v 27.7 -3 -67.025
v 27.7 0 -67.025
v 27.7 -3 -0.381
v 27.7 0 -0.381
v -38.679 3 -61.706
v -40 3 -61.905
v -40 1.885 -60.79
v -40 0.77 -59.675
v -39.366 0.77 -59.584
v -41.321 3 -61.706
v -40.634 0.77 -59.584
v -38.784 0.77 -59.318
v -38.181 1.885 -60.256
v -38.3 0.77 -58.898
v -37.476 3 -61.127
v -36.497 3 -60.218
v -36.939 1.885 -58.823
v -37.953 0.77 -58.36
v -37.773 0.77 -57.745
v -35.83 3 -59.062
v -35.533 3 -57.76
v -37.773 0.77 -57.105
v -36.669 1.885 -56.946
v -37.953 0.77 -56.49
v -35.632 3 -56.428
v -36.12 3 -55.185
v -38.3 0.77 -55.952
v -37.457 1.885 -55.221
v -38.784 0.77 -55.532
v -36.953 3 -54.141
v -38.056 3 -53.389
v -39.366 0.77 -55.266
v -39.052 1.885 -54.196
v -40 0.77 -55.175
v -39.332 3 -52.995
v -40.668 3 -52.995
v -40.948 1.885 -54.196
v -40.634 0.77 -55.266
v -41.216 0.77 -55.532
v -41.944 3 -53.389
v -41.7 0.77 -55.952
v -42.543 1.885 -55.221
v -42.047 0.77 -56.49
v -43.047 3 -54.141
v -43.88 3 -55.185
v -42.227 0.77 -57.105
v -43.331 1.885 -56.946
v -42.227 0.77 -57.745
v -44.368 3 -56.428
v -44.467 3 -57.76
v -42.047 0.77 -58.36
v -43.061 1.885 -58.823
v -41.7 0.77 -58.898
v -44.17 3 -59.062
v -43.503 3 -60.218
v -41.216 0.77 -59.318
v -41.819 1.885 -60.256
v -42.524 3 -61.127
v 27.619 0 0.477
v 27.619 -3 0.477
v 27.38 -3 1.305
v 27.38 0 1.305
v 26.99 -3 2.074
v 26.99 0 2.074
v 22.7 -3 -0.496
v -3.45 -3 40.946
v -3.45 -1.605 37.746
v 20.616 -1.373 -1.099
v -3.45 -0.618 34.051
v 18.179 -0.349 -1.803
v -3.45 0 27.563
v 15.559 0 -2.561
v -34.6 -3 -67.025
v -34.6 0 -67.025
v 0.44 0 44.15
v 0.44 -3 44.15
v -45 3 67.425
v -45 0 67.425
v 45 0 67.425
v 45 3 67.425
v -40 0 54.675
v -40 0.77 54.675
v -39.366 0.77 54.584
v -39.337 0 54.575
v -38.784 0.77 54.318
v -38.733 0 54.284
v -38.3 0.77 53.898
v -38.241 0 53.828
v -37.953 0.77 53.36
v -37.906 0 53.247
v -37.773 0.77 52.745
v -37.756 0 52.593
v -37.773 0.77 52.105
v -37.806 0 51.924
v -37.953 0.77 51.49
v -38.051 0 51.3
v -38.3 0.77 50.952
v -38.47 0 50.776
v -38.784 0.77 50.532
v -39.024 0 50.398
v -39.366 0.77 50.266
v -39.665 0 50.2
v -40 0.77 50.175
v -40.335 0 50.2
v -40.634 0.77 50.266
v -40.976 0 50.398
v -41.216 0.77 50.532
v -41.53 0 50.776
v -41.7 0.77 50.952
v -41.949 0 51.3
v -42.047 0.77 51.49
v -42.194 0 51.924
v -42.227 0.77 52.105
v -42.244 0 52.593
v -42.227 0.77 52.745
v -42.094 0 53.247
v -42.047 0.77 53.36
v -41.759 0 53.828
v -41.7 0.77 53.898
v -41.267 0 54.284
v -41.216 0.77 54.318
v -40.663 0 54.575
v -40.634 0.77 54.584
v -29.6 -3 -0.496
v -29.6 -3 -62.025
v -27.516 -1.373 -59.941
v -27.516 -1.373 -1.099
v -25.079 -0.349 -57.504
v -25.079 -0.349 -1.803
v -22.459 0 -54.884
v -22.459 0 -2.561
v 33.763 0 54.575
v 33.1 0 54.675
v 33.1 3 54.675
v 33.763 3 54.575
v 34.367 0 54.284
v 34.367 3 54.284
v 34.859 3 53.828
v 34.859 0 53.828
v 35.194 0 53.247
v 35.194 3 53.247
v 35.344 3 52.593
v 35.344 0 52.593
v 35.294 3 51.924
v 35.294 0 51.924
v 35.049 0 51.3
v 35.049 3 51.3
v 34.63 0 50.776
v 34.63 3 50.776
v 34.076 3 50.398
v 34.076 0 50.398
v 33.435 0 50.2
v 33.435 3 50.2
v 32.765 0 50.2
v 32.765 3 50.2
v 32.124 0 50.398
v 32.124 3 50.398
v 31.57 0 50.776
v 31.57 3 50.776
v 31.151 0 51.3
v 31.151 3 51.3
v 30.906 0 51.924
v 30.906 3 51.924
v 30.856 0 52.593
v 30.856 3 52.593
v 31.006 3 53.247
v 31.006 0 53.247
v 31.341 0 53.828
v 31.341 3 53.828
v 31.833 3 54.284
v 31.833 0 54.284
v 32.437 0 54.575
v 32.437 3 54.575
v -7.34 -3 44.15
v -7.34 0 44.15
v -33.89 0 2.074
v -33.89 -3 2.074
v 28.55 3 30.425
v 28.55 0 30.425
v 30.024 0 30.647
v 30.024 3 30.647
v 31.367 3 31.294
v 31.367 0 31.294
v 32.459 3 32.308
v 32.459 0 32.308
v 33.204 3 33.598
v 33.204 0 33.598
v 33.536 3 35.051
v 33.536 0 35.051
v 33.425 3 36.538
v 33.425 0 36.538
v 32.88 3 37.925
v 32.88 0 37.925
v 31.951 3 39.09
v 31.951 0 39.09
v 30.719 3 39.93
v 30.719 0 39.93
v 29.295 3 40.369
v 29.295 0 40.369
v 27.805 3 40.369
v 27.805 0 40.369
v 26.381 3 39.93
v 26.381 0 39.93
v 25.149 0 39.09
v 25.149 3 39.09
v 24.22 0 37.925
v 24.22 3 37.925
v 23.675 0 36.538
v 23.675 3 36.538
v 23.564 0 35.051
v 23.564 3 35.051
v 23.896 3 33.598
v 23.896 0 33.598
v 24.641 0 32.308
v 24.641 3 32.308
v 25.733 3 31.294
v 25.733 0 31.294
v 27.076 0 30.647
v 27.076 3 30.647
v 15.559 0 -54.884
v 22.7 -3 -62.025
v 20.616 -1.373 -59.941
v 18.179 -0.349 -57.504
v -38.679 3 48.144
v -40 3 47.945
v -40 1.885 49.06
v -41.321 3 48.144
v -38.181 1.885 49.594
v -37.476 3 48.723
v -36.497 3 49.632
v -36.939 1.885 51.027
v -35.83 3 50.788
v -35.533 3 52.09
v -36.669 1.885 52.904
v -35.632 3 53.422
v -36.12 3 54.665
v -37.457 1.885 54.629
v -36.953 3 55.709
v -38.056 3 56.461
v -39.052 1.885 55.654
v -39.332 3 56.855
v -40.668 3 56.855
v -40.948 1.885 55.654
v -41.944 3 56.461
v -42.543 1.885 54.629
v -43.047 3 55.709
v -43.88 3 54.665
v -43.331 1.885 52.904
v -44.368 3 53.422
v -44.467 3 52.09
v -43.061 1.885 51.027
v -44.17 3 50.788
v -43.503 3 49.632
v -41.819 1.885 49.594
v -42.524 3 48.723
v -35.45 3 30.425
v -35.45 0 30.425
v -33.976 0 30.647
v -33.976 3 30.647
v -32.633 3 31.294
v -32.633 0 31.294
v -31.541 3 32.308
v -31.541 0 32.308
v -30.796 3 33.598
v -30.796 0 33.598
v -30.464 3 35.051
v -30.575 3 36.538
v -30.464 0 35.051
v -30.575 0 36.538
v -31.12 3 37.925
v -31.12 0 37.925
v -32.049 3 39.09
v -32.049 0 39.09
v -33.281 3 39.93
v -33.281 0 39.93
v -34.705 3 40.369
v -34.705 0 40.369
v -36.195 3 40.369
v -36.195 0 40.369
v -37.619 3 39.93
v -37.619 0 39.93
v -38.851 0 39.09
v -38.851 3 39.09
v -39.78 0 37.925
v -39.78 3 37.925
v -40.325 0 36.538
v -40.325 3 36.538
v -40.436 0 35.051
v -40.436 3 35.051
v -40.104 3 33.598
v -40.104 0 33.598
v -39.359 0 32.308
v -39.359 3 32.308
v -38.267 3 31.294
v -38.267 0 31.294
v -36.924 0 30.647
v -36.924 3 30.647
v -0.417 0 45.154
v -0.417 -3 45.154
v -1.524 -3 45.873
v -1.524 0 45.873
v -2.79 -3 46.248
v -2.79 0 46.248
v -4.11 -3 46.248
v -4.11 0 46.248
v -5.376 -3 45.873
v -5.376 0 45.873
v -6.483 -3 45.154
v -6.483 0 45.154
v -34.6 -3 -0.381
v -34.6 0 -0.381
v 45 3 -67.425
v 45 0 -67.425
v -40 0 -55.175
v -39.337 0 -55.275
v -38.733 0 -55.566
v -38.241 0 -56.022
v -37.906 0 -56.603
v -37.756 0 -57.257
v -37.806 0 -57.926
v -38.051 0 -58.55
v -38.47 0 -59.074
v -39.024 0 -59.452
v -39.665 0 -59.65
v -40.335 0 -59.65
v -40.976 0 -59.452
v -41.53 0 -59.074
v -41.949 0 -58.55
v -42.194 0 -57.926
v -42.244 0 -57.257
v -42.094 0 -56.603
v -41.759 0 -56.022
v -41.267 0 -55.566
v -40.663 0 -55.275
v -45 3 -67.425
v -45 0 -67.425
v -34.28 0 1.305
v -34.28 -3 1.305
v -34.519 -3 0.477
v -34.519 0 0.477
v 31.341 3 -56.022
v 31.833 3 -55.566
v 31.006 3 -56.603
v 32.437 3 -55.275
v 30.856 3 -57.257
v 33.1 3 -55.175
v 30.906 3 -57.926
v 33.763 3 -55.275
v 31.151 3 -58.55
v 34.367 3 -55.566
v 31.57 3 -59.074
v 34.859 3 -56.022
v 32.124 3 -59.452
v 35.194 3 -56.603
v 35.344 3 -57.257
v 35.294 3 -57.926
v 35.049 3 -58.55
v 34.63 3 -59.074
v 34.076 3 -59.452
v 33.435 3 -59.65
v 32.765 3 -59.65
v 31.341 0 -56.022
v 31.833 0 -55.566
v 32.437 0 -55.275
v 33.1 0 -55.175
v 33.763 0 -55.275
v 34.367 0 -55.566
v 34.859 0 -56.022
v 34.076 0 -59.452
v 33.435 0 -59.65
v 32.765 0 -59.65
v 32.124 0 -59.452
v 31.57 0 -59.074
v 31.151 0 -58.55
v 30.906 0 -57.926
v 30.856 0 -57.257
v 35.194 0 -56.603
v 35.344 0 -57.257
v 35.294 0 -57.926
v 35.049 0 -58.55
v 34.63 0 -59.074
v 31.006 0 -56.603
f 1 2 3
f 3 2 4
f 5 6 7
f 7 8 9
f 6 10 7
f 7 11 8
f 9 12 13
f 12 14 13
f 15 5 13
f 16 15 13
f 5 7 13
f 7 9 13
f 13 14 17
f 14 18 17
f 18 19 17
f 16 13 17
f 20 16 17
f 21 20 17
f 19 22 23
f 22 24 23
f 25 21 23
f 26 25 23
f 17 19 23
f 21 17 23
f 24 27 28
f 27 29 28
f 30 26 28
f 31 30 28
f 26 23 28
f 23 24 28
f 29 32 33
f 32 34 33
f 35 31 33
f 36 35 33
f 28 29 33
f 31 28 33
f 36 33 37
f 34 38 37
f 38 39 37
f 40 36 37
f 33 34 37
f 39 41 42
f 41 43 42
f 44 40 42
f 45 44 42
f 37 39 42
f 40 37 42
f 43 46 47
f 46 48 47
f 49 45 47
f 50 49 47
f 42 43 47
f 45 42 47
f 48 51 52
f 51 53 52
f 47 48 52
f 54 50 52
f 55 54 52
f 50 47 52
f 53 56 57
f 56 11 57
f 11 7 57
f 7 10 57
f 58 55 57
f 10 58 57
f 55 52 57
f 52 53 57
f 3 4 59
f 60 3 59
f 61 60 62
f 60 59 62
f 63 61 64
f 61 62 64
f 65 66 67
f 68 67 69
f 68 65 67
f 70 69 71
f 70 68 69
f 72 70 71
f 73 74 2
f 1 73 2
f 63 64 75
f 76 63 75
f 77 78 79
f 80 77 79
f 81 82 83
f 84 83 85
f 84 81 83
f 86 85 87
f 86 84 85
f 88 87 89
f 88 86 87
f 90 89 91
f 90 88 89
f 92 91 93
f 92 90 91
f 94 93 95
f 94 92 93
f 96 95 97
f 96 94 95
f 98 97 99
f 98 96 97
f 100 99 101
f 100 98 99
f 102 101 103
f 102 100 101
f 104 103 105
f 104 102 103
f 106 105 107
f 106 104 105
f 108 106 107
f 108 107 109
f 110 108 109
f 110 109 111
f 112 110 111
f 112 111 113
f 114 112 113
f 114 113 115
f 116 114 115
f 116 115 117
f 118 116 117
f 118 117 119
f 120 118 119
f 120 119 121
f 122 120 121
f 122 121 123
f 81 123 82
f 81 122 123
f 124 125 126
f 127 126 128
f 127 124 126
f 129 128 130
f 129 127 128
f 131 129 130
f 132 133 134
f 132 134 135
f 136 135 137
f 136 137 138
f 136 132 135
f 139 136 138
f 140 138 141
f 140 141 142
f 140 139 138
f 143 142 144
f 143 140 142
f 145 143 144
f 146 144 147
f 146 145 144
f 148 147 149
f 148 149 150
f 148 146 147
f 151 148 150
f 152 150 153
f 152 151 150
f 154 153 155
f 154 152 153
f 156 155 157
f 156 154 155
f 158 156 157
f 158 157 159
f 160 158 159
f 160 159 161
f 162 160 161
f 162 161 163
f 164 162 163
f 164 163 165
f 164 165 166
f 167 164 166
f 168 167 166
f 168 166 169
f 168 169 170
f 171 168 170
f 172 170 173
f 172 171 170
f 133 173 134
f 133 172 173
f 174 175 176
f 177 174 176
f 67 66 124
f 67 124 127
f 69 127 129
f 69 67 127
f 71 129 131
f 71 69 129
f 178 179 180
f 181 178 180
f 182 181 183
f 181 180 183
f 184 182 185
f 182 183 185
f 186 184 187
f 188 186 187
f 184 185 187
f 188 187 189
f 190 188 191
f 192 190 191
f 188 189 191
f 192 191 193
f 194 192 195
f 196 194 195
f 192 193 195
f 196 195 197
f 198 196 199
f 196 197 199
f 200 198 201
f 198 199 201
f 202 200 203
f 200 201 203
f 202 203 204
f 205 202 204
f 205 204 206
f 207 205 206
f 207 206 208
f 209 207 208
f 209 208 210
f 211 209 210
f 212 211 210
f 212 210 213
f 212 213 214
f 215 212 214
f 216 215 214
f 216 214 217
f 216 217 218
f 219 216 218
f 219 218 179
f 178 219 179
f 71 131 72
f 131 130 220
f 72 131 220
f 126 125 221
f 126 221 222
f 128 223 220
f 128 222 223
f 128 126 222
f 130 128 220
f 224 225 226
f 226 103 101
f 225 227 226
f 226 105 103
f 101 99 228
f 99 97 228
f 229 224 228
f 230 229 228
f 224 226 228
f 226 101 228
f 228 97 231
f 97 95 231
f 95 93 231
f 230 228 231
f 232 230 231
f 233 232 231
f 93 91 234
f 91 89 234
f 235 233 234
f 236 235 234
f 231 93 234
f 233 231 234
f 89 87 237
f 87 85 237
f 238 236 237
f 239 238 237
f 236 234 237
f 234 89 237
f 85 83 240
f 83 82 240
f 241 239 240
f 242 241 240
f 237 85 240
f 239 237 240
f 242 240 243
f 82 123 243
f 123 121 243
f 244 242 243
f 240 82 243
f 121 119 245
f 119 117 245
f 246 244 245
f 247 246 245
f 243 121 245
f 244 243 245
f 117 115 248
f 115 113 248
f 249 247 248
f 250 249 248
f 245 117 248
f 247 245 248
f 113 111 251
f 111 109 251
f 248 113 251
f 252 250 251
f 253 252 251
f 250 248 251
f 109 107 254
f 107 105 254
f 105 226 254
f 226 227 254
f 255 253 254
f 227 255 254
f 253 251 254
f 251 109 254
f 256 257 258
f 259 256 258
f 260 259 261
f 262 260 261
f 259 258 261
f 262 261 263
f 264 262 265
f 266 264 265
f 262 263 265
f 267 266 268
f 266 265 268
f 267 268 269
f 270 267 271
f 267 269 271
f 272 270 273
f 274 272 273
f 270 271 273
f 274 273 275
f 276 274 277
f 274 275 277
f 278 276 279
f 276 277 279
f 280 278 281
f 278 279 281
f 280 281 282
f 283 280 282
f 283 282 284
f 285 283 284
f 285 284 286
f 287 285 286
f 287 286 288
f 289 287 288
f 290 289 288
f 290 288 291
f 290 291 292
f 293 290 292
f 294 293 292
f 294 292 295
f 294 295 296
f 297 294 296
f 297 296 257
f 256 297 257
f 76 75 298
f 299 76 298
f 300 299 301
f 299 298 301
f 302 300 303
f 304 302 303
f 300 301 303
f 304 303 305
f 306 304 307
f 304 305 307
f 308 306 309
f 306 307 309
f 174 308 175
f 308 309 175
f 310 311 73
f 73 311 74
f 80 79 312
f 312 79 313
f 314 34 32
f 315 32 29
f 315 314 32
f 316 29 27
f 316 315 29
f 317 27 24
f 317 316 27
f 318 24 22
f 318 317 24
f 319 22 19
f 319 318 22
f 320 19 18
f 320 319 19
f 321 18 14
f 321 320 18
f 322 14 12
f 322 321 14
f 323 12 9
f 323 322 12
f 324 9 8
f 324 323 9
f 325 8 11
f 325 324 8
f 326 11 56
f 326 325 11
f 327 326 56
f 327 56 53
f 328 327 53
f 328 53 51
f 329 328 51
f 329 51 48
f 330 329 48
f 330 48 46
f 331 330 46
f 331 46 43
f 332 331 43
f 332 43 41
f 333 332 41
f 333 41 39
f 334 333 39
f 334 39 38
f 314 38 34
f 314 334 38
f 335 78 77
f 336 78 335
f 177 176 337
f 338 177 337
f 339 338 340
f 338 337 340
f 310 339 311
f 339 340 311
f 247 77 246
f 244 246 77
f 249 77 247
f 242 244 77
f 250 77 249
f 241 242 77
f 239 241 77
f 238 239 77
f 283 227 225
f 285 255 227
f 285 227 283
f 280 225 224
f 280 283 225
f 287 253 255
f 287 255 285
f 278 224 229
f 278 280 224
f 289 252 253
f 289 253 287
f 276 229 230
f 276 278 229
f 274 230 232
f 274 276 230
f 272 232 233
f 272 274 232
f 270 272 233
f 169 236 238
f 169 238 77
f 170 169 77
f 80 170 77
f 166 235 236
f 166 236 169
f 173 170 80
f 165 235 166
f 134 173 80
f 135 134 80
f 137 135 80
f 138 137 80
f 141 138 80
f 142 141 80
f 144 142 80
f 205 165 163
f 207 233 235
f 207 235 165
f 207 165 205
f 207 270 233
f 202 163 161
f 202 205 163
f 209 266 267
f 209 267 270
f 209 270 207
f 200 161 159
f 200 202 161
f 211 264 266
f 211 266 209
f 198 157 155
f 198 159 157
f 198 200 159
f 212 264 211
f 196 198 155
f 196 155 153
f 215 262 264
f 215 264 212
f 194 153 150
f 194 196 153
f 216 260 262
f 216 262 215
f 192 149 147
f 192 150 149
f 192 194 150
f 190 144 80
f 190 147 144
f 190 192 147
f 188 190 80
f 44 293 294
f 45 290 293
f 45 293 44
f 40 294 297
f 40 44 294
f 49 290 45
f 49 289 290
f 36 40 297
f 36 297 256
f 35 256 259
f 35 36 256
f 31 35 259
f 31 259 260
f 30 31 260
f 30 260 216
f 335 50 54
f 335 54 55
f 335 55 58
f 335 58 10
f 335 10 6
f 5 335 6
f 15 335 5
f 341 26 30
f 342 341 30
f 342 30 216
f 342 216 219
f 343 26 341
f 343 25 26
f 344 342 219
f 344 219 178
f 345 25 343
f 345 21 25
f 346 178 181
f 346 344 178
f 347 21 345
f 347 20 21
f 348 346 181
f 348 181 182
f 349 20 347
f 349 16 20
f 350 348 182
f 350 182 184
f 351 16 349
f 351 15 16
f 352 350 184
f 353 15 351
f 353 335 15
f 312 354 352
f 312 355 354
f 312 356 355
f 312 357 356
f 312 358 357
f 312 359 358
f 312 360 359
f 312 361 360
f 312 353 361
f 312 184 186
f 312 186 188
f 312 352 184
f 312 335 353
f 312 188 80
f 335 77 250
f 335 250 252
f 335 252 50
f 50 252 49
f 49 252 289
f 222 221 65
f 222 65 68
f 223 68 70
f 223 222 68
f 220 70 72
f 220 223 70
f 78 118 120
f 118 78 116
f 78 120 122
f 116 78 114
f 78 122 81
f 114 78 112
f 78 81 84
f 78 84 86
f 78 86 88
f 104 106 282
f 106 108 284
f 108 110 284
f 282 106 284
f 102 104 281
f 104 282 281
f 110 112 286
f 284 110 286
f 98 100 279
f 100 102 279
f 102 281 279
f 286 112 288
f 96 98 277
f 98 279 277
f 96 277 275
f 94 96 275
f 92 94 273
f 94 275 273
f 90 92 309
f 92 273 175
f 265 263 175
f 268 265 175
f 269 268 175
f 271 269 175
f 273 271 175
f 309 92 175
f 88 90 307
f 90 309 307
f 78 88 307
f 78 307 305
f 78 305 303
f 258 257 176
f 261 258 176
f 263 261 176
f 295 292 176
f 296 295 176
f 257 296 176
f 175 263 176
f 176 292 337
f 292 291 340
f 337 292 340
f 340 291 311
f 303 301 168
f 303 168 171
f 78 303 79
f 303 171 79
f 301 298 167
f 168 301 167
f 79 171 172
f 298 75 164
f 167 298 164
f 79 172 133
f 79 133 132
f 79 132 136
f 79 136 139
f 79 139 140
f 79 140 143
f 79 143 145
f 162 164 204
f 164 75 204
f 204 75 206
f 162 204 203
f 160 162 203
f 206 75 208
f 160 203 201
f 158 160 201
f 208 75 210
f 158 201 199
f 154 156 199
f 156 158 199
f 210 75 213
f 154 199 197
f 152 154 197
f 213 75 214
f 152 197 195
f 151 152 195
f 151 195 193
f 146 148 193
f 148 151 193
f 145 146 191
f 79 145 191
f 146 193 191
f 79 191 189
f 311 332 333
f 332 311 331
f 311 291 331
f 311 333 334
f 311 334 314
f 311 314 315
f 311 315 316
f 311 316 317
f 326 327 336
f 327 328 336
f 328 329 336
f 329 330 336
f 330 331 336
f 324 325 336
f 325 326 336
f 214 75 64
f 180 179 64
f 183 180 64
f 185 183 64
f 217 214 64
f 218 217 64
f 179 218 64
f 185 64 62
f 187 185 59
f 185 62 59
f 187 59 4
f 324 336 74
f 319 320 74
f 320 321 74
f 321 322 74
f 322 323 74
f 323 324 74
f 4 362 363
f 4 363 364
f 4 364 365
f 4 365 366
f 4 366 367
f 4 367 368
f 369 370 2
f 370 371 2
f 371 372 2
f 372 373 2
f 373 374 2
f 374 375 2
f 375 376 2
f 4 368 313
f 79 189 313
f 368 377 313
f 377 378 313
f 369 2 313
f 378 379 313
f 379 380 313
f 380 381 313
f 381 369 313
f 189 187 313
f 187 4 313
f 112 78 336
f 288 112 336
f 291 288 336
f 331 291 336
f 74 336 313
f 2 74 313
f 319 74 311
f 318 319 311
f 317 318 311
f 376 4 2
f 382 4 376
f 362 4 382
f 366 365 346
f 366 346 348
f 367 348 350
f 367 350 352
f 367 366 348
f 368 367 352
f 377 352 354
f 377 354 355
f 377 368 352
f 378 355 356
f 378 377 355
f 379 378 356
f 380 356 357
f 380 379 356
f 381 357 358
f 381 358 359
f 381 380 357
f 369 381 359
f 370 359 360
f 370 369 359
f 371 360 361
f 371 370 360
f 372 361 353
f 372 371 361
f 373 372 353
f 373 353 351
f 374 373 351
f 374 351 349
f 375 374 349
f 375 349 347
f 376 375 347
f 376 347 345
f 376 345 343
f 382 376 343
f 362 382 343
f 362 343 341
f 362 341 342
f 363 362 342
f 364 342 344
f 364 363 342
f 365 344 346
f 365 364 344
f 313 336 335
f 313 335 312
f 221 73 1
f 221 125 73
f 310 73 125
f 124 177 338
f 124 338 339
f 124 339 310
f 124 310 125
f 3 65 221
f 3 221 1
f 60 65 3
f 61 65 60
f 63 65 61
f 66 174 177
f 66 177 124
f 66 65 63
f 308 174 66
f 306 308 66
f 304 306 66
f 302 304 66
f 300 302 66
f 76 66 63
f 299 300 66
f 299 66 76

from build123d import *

# Parameters (mm, degrees)
SKETCH1_W                                            = 90
SKETCH1_H                                            = 134.85
SKETCH1_R                                            = 2.25
BOSS_EXTRUDE1_DEPTH                                  = 3
SKETCH2_R                                            = 5
CUT_EXTRUDE1_DEPTH                                   = 10
BOSS_EXTRUDE2_DEPTH                                  = 3
FILLET1_R                                            = 10
AVELLANADO_PARA_TORNILLO_TAP_N_AVELLANAD_D           = 4.5
AVELLANADO_PARA_TORNILLO_TAP_N_AVELLANAD_DEPTH       = 6
AVELLANADO_PARA_TORNILLO_TAP_N_AVELLANAD_CSINK_D     = 8.96
AVELLANADO_PARA_TORNILLO_TAP_N_AVELLANAD_CSINK_ANGLE = 90
AVELLANADO_PARA_TORNILLO_TAP_N_AVELLANAD_TIP         = 1.351936393


with BuildPart() as part:
    # Sketch1 → Boss-Extrude1 (new body)
    with BuildSketch(Plane(origin=(0, 0, 0), x_dir=(1, 0, 0), z_dir=(0, 1, 0))):
        Rectangle(SKETCH1_W, SKETCH1_H)
        with Locations(Location((-40, 57.425, 0), (0, 0, 270))):
            Circle(SKETCH1_R, mode=Mode.SUBTRACT)
        with Locations(Location((33.1, 57.425, 0), (0, 0, 270))):
            Circle(SKETCH1_R, mode=Mode.SUBTRACT)
        with Locations(Location((33.1, -52.425, 0), (0, 0, 270))):
            Circle(SKETCH1_R, mode=Mode.SUBTRACT)
        with Locations(Location((-40, -52.425, 0), (0, 0, 270))):
            Circle(SKETCH1_R, mode=Mode.SUBTRACT)
    extrude(amount=BOSS_EXTRUDE1_DEPTH)

    # Sketch2 → Cut-Extrude1 (cut)
    with BuildSketch(Plane.XZ):
        with Locations(Location((-35.45, 35.425, 0), (0, 0, 270))):
            Circle(SKETCH2_R)
        with Locations(Location((28.55, 35.425, 0), (0, 0, 270))):
            Circle(SKETCH2_R)
    extrude(amount=-CUT_EXTRUDE1_DEPTH, mode=Mode.SUBTRACT)

    # Sketch3 → Boss-Extrude2 (add)
    with BuildSketch(Plane.XZ):
        with BuildLine():
            Line((-34.6, -0.380630602), (-34.6, -67.025))
            Line((-34.6, -67.025), (27.7, -67.025))
            Line((27.7, -67.025), (27.7, -0.380630602))
            ThreePointArc((27.7, -0.380630602), (27.519005613, 0.897019347), (26.990265482, 2.074126918))
            Line((26.990265482, 2.074126918), (0.440265482, 44.150196648))
            ThreePointArc((0.440265482, 44.150196648), (-3.45, 46.295439129), (-7.340265482, 44.150196648))
            Line((-7.340265482, 44.150196648), (-33.890265482, 2.074126918))
            ThreePointArc((-33.890265482, 2.074126918), (-34.419005613, 0.897019347), (-34.6, -0.380630602))
        make_face()
        Polygon((-29.6, -0.49628105), (-29.6, -62.025), (22.7, -62.025), (22.7, -0.49628105), (-3.45, 40.945874259), align=None, mode=Mode.SUBTRACT)
    extrude(amount=BOSS_EXTRUDE2_DEPTH)

    # Fillet1
    # the kernel refuses this fillet: 10 mm, written as the material it adds along each edge
    with BuildSketch(Plane(origin=(32.227432138, 0, -15.595222631), x_dir=(0, -1, 0), z_dir=(-0.5336429389662942, 0, 0.8457098874267795))) as fillet1_piece_1_section:
        with BuildLine():
            CenterArc((10, -7.141428429), FILLET1_R, 134.427004001, 45.572995999)
            Line((0, -7.141428429), (-0.2, -7.141428429))
            Line((-0.2, -7.141428429), (-0.2, 0))
            Line((-0.2, 0), (0, 0.2))
            ThreePointArc((0, 0.2), (1.5, 0.2), (2.86, 0.142828569))
            Line((2.86, 0.142828569), (3, 0))
        make_face()
    fillet1_piece_1 = extrude(amount=84.709945498, mode=Mode.PRIVATE)
    fillet1_piece_1 = split(fillet1_piece_1, bisect_by=Plane(origin=(-18.807365912, 0, 16.607734938), z_dir=(0.8457098874267777, 0, -0.533642938966297)), keep=Keep.TOP, mode=Mode.PRIVATE)
    fillet1_piece_1 = split(fillet1_piece_1, bisect_by=Plane(origin=(22.7, 0, -15.595222631), z_dir=(-1, 0, 0)), keep=Keep.TOP, mode=Mode.PRIVATE)
    add(fillet1_piece_1)
    with BuildSketch(Plane(origin=(22.7, 0, -62.025), x_dir=(0, -1, 0), z_dir=(0, 0, 1))) as fillet1_piece_2_section:
        with BuildLine():
            CenterArc((10, -7.141428429), FILLET1_R, 134.427004001, 45.572995999)
            Line((0, -7.141428429), (-0.2, -7.141428429))
            Line((-0.2, -7.141428429), (-0.2, 0))
            Line((-0.2, 0), (0, 0.2))
            ThreePointArc((0, 0.2), (1.5, 0.2), (2.86, 0.142828569))
            Line((2.86, 0.142828569), (3, 0))
        make_face()
    fillet1_piece_2 = extrude(amount=79.382290022, mode=Mode.PRIVATE)
    fillet1_piece_2 = split(fillet1_piece_2, bisect_by=Plane(origin=(50.468348322, 0, -44.503172209), z_dir=(-0.8457098874267795, 0, -0.5336429389662942)), keep=Keep.TOP, mode=Mode.PRIVATE)
    add(fillet1_piece_2)
    with BuildSketch(Plane(origin=(-29.6, 0, -62.025), x_dir=(0, -1, 0), z_dir=(1, 0, 0))) as fillet1_piece_3:
        with BuildLine():
            CenterArc((10, -7.141428429), FILLET1_R, 134.427004001, 45.572995999)
            Line((0, -7.141428429), (-0.2, -7.141428429))
            Line((-0.2, -7.141428429), (-0.2, 0))
            Line((-0.2, 0), (0, 0.2))
            ThreePointArc((0, 0.2), (1.5, 0.2), (2.86, 0.142828569))
            Line((2.86, 0.142828569), (3, 0))
        make_face()
    extrude(amount=52.3)
    with BuildSketch(Plane(origin=(-29.6, 0, 17.357290022), x_dir=(0, -1, 0), z_dir=(0, 0, -1))) as fillet1_piece_4_section:
        with BuildLine():
            CenterArc((10, -7.141428429), FILLET1_R, 134.427004001, 45.572995999)
            Line((0, -7.141428429), (-0.2, -7.141428429))
            Line((-0.2, -7.141428429), (-0.2, 0))
            Line((-0.2, 0), (0, 0.2))
            ThreePointArc((0, 0.2), (1.5, 0.2), (2.86, 0.142828569))
            Line((2.86, 0.142828569), (3, 0))
        make_face()
    fillet1_piece_4 = extrude(amount=79.382290022, mode=Mode.PRIVATE)
    fillet1_piece_4 = split(fillet1_piece_4, bisect_by=Plane(origin=(-21.542556439, 0, 12.273043135), z_dir=(0.8457098874267777, 0, -0.533642938966297)), keep=Keep.TOP, mode=Mode.PRIVATE)
    add(fillet1_piece_4)
    with BuildSketch(Plane(origin=(6.077432138, 0, 56.04481584), x_dir=(0, -1, 0), z_dir=(-0.5336429389662971, 0, -0.8457098874267778))) as fillet1_piece_5_section:
        with BuildLine():
            CenterArc((10, -7.141428429), FILLET1_R, 134.427004001, 45.572995999)
            Line((0, -7.141428429), (-0.2, -7.141428429))
            Line((-0.2, -7.141428429), (-0.2, 0))
            Line((-0.2, 0), (0, 0.2))
            ThreePointArc((0, 0.2), (1.5, 0.2), (2.86, 0.142828569))
            Line((2.86, 0.142828569), (3, 0))
        make_face()
    fillet1_piece_5 = extrude(amount=84.709945498, mode=Mode.PRIVATE)
    fillet1_piece_5 = split(fillet1_piece_5, bisect_by=Plane(origin=(-7.551087235, 0, 47.445220116), z_dir=(-0.8457098874267795, 0, -0.5336429389662942)), keep=Keep.TOP, mode=Mode.PRIVATE)
    fillet1_piece_5 = split(fillet1_piece_5, bisect_by=Plane(origin=(-29.6, 0, 56.04481584), z_dir=(1, 0, 0)), keep=Keep.TOP, mode=Mode.PRIVATE)
    add(fillet1_piece_5)
    with BuildSketch(Plane(origin=(32.227432138, 0, -15.595222631), x_dir=(0, -1, 0), z_dir=(-0.5336429389662942, 0, 0.8457098874267795))) as fillet1_piece_6a_section:
        with BuildLine():
            CenterArc((10, -7.141428429), FILLET1_R, 134.427004001, 45.572995999)
            Line((0, -7.141428429), (-0.2, -7.141428429))
            Line((-0.2, -7.141428429), (-0.2, 0))
            Line((-0.2, 0), (0, 0.2))
            ThreePointArc((0, 0.2), (1.5, 0.2), (2.86, 0.142828569))
            Line((2.86, 0.142828569), (3, 0))
        make_face()
    fillet1_piece_6a = extrude(amount=84.709945498, mode=Mode.PRIVATE)
    fillet1_piece_6a = split(fillet1_piece_6a, bisect_by=Plane(origin=(22.7, 0, -15.595222631), z_dir=(1, 0, 0)), keep=Keep.TOP, mode=Mode.PRIVATE)
    with BuildSketch(Plane(origin=(22.7, 0, -62.025), x_dir=(0, -1, 0), z_dir=(0, 0, 1))) as fillet1_piece_6b_section:
        with BuildLine():
            CenterArc((10, -7.141428429), FILLET1_R, 134.427004001, 45.572995999)
            Line((0, -7.141428429), (-0.2, -7.141428429))
            Line((-0.2, -7.141428429), (-0.2, 0))
            Line((-0.2, 0), (0, 0.2))
            ThreePointArc((0, 0.2), (1.5, 0.2), (2.86, 0.142828569))
            Line((2.86, 0.142828569), (3, 0))
        make_face()
    fillet1_piece_6b = extrude(amount=79.382290022, mode=Mode.PRIVATE)
    fillet1_piece_6b = split(fillet1_piece_6b, bisect_by=Plane(origin=(50.468348322, 0, -44.503172209), z_dir=(0.8457098874267795, 0, 0.5336429389662942)), keep=Keep.TOP, mode=Mode.PRIVATE)
    fillet1_piece_6 = fillet1_piece_6a & fillet1_piece_6b
    add(fillet1_piece_6)
    with BuildSketch(Plane(origin=(6.077432138, 0, 56.04481584), x_dir=(0, -1, 0), z_dir=(-0.5336429389662971, 0, -0.8457098874267778))) as fillet1_piece_7a_section:
        with BuildLine():
            CenterArc((10, -7.141428429), FILLET1_R, 134.427004001, 45.572995999)
            Line((0, -7.141428429), (-0.2, -7.141428429))
            Line((-0.2, -7.141428429), (-0.2, 0))
            Line((-0.2, 0), (0, 0.2))
            ThreePointArc((0, 0.2), (1.5, 0.2), (2.86, 0.142828569))
            Line((2.86, 0.142828569), (3, 0))
        make_face()
    fillet1_piece_7a = extrude(amount=84.709945498, mode=Mode.PRIVATE)
    fillet1_piece_7a = split(fillet1_piece_7a, bisect_by=Plane(origin=(-7.551087235, 0, 47.445220116), z_dir=(0.8457098874267795, 0, 0.5336429389662942)), keep=Keep.TOP, mode=Mode.PRIVATE)
    with BuildSketch(Plane(origin=(32.227432138, 0, -15.595222631), x_dir=(0, -1, 0), z_dir=(-0.5336429389662942, 0, 0.8457098874267795))) as fillet1_piece_7b_section:
        with BuildLine():
            CenterArc((10, -7.141428429), FILLET1_R, 134.427004001, 45.572995999)
            Line((0, -7.141428429), (-0.2, -7.141428429))
            Line((-0.2, -7.141428429), (-0.2, 0))
            Line((-0.2, 0), (0, 0.2))
            ThreePointArc((0, 0.2), (1.5, 0.2), (2.86, 0.142828569))
            Line((2.86, 0.142828569), (3, 0))
        make_face()
    fillet1_piece_7b = extrude(amount=84.709945498, mode=Mode.PRIVATE)
    fillet1_piece_7b = split(fillet1_piece_7b, bisect_by=Plane(origin=(-18.807365912, 0, 16.607734938), z_dir=(-0.8457098874267777, 0, 0.533642938966297)), keep=Keep.TOP, mode=Mode.PRIVATE)
    fillet1_piece_7 = fillet1_piece_7a & fillet1_piece_7b
    add(fillet1_piece_7)
    with BuildSketch(Plane(origin=(22.7, 0, -79.878571071), x_dir=(0, -1, 0), z_dir=(0, 0, 1))) as fillet1_piece_8a_section:
        with BuildLine():
            CenterArc((10, -7.141428429), FILLET1_R, 134.427004001, 45.572995999)
            Line((0, -7.141428429), (-0.2, -7.141428429))
            Line((-0.2, -7.141428429), (-0.2, 0))
            Line((-0.2, 0), (0, 0.2))
            ThreePointArc((0, 0.2), (1.5, 0.2), (2.86, 0.142828569))
            Line((2.86, 0.142828569), (3, 0))
        make_face()
    fillet1_piece_8a = extrude(amount=97.235861093, mode=Mode.PRIVATE)
    fillet1_piece_8a = split(fillet1_piece_8a, bisect_by=Plane(origin=(22.7, 0, -62.025), z_dir=(0, 0, -1)), keep=Keep.TOP, mode=Mode.PRIVATE)
    with BuildSketch(Plane(origin=(-29.6, 0, -62.025), x_dir=(0, -1, 0), z_dir=(1, 0, 0))) as fillet1_piece_8b_section:
        with BuildLine():
            CenterArc((10, -7.141428429), FILLET1_R, 134.427004001, 45.572995999)
            Line((0, -7.141428429), (-0.2, -7.141428429))
            Line((-0.2, -7.141428429), (-0.2, 0))
            Line((-0.2, 0), (0, 0.2))
            ThreePointArc((0, 0.2), (1.5, 0.2), (2.86, 0.142828569))
            Line((2.86, 0.142828569), (3, 0))
        make_face()
    fillet1_piece_8b = extrude(amount=70.153571071, mode=Mode.PRIVATE)
    fillet1_piece_8b = split(fillet1_piece_8b, bisect_by=Plane(origin=(22.7, 0, -62.025), z_dir=(1, 0, 0)), keep=Keep.TOP, mode=Mode.PRIVATE)
    fillet1_piece_8 = fillet1_piece_8a & fillet1_piece_8b
    add(fillet1_piece_8)
    with BuildSketch(Plane(origin=(-47.453571071, 0, -62.025), x_dir=(0, -1, 0), z_dir=(1, 0, 0))) as fillet1_piece_9a_section:
        with BuildLine():
            CenterArc((10, -7.141428429), FILLET1_R, 134.427004001, 45.572995999)
            Line((0, -7.141428429), (-0.2, -7.141428429))
            Line((-0.2, -7.141428429), (-0.2, 0))
            Line((-0.2, 0), (0, 0.2))
            ThreePointArc((0, 0.2), (1.5, 0.2), (2.86, 0.142828569))
            Line((2.86, 0.142828569), (3, 0))
        make_face()
    fillet1_piece_9a = extrude(amount=70.153571071, mode=Mode.PRIVATE)
    fillet1_piece_9a = split(fillet1_piece_9a, bisect_by=Plane(origin=(-29.6, 0, -62.025), z_dir=(-1, 0, 0)), keep=Keep.TOP, mode=Mode.PRIVATE)
    with BuildSketch(Plane(origin=(-29.6, 0, 17.357290022), x_dir=(0, -1, 0), z_dir=(0, 0, -1))) as fillet1_piece_9b_section:
        with BuildLine():
            CenterArc((10, -7.141428429), FILLET1_R, 134.427004001, 45.572995999)
            Line((0, -7.141428429), (-0.2, -7.141428429))
            Line((-0.2, -7.141428429), (-0.2, 0))
            Line((-0.2, 0), (0, 0.2))
            ThreePointArc((0, 0.2), (1.5, 0.2), (2.86, 0.142828569))
            Line((2.86, 0.142828569), (3, 0))
        make_face()
    fillet1_piece_9b = extrude(amount=97.235861093, mode=Mode.PRIVATE)
    fillet1_piece_9b = split(fillet1_piece_9b, bisect_by=Plane(origin=(-29.6, 0, -62.025), z_dir=(0, 0, -1)), keep=Keep.TOP, mode=Mode.PRIVATE)
    fillet1_piece_9 = fillet1_piece_9a & fillet1_piece_9b
    add(fillet1_piece_9)
    with BuildSketch(Plane(origin=(6.077432138, 0, 56.04481584), x_dir=(0, -1, 0), z_dir=(-0.5336429389662971, 0, -0.8457098874267778))) as fillet1_piece_10a_section:
        with BuildLine():
            CenterArc((10, -7.141428429), FILLET1_R, 134.427004001, 45.572995999)
            Line((0, -7.141428429), (-0.2, -7.141428429))
            Line((-0.2, -7.141428429), (-0.2, 0))
            Line((-0.2, 0), (0, 0.2))
            ThreePointArc((0, 0.2), (1.5, 0.2), (2.86, 0.142828569))
            Line((2.86, 0.142828569), (3, 0))
        make_face()
    fillet1_piece_10a = extrude(amount=84.709945498, mode=Mode.PRIVATE)
    fillet1_piece_10a = split(fillet1_piece_10a, bisect_by=Plane(origin=(-29.6, 0, 56.04481584), z_dir=(-1, 0, 0)), keep=Keep.TOP, mode=Mode.PRIVATE)
    with BuildSketch(Plane(origin=(-29.6, 0, 17.357290022), x_dir=(0, -1, 0), z_dir=(0, 0, -1))) as fillet1_piece_10b_section:
        with BuildLine():
            CenterArc((10, -7.141428429), FILLET1_R, 134.427004001, 45.572995999)
            Line((0, -7.141428429), (-0.2, -7.141428429))
            Line((-0.2, -7.141428429), (-0.2, 0))
            Line((-0.2, 0), (0, 0.2))
            ThreePointArc((0, 0.2), (1.5, 0.2), (2.86, 0.142828569))
            Line((2.86, 0.142828569), (3, 0))
        make_face()
    fillet1_piece_10b = extrude(amount=79.382290022, mode=Mode.PRIVATE)
    fillet1_piece_10b = split(fillet1_piece_10b, bisect_by=Plane(origin=(-21.542556439, 0, 12.273043135), z_dir=(-0.8457098874267777, 0, 0.533642938966297)), keep=Keep.TOP, mode=Mode.PRIVATE)
    fillet1_piece_10 = fillet1_piece_10a & fillet1_piece_10b
    add(fillet1_piece_10)

    # Avellanado para tornillo tapón avellanado de clavija hexagonal de M41
    with Locations(Plane(origin=(-40, 3, 52.425), x_dir=(0, 0, 1), z_dir=(0, 1, 0))):
        with Locations((0, 0), (-109.85, 0)):
            CounterSinkHole(AVELLANADO_PARA_TORNILLO_TAP_N_AVELLANAD_D / 2, AVELLANADO_PARA_TORNILLO_TAP_N_AVELLANAD_CSINK_D / 2, depth=AVELLANADO_PARA_TORNILLO_TAP_N_AVELLANAD_DEPTH, counter_sink_angle=AVELLANADO_PARA_TORNILLO_TAP_N_AVELLANAD_CSINK_ANGLE)
            with Locations((0, 0, -(AVELLANADO_PARA_TORNILLO_TAP_N_AVELLANAD_DEPTH + AVELLANADO_PARA_TORNILLO_TAP_N_AVELLANAD_TIP / 2))):  # 118° drill point
                Cone(0, AVELLANADO_PARA_TORNILLO_TAP_N_AVELLANAD_D / 2, AVELLANADO_PARA_TORNILLO_TAP_N_AVELLANAD_TIP, mode=Mode.SUBTRACT)


solid = part.part
